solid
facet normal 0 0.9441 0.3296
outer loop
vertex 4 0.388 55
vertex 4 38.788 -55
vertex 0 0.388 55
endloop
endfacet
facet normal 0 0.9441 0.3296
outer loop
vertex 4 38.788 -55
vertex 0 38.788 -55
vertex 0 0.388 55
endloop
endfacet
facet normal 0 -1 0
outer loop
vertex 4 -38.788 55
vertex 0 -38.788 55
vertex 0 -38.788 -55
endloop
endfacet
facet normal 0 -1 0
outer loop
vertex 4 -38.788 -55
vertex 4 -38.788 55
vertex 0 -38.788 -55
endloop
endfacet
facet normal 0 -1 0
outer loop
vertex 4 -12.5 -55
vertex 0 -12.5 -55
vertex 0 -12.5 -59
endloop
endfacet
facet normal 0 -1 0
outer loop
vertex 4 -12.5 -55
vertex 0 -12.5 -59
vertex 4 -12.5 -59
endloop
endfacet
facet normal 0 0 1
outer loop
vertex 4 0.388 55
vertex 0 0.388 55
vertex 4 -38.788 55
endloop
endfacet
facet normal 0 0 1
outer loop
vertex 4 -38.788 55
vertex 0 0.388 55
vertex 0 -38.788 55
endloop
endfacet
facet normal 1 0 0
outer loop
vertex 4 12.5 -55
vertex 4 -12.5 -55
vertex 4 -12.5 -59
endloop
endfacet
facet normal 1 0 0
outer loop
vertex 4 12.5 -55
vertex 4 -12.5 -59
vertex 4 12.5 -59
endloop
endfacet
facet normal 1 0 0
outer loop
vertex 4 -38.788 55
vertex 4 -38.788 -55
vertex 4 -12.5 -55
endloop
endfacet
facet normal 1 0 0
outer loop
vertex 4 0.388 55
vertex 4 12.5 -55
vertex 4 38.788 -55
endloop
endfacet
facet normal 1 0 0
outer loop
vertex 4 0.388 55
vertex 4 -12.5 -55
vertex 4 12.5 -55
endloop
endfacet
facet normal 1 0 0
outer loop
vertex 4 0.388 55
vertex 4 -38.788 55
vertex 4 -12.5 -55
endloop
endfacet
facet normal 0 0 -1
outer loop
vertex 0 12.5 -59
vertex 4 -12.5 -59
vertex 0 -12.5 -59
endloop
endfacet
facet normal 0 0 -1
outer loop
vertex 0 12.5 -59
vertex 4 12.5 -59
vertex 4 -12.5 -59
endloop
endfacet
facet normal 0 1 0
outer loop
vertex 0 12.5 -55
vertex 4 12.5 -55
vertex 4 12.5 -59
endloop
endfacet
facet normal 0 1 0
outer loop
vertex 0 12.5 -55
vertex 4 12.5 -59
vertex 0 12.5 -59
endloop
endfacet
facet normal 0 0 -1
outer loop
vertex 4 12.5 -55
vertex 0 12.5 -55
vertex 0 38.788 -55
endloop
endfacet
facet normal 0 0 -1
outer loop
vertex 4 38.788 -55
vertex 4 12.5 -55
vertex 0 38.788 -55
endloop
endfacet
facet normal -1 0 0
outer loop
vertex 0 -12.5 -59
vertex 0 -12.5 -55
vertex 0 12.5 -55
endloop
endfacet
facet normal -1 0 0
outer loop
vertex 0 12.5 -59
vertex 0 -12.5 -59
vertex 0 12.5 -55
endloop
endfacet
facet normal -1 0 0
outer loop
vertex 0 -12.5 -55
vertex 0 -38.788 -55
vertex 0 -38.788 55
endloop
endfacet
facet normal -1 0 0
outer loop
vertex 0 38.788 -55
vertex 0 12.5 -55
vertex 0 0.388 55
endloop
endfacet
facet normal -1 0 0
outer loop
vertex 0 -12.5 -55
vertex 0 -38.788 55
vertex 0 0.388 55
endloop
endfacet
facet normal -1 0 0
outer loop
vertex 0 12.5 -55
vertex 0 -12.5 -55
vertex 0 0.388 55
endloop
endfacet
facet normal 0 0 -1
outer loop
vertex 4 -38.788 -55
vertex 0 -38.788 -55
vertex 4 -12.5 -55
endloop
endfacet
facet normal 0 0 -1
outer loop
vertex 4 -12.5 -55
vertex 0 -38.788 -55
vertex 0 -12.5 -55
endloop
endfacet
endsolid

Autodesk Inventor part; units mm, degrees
ref_plane "YZ Plane" through (0, 0, 0) normal (1, 0, 0) x (0, 1, 0)
ref_plane "XZ Plane" through (0, 0, 0) normal (0, 1, 0) x (-1, 0, 0)
ref_plane "XY Plane" through (0, 0, 0) normal (0, 0, 1) x (1, 0, 0)
sketch "Esboço1" plane through (0, 0, 0) normal (1, 0, 0) x (0, 1, 0)
  line L0 (0.3875, 55) -> (-38.7875, 55)
  line L1 (-38.7875, 55) -> (-38.7875, -55)
  line L2 (-38.7875, -55) -> (38.7875, -55)
  line L3 (38.7875, -55) -> (0.3875, 55)
  point P0 (0, 0)
  point P1 (19.5875, 0)
  point P2 (0, -55)
  dimension "d4" = 77.575
  dimension "d5" = 110
  dimension "d6" = 39.175
extrude "Extrusão1" add sketch "Esboço1" along normal blind 4
sketch "Esboço2" plane through (0, -38.7875, -55) normal (0, 0, -1) x (-1, 0, 0)
  line L0 (0, 0) -> (-4, 0) projected
  line L1 (0, 77.575) -> (-4, 77.575) projected
  line L2 (-4, 0) -> (-4, 77.575) projected
  line L3 (0, 39.175) -> (0, 0) projected
  line L4 (-4, 51.2875) -> (0, 51.2875)
  line L5 (0, 51.2875) -> (0, 26.2875)
  line L6 (0, 26.2875) -> (-4, 26.2875)
  line L7 (-4, 26.2875) -> (-4, 51.2875)
  point P0 (0, 38.7875)
  dimension "d7" = 77.575
  dimension "d8" = 25
  dimension "d9" = 26.2875
extrude "Extrusão2" add sketch "Esboço2" along normal blind 4 contours L6 L2 L4 L5 L3
properties part number "suporte"
